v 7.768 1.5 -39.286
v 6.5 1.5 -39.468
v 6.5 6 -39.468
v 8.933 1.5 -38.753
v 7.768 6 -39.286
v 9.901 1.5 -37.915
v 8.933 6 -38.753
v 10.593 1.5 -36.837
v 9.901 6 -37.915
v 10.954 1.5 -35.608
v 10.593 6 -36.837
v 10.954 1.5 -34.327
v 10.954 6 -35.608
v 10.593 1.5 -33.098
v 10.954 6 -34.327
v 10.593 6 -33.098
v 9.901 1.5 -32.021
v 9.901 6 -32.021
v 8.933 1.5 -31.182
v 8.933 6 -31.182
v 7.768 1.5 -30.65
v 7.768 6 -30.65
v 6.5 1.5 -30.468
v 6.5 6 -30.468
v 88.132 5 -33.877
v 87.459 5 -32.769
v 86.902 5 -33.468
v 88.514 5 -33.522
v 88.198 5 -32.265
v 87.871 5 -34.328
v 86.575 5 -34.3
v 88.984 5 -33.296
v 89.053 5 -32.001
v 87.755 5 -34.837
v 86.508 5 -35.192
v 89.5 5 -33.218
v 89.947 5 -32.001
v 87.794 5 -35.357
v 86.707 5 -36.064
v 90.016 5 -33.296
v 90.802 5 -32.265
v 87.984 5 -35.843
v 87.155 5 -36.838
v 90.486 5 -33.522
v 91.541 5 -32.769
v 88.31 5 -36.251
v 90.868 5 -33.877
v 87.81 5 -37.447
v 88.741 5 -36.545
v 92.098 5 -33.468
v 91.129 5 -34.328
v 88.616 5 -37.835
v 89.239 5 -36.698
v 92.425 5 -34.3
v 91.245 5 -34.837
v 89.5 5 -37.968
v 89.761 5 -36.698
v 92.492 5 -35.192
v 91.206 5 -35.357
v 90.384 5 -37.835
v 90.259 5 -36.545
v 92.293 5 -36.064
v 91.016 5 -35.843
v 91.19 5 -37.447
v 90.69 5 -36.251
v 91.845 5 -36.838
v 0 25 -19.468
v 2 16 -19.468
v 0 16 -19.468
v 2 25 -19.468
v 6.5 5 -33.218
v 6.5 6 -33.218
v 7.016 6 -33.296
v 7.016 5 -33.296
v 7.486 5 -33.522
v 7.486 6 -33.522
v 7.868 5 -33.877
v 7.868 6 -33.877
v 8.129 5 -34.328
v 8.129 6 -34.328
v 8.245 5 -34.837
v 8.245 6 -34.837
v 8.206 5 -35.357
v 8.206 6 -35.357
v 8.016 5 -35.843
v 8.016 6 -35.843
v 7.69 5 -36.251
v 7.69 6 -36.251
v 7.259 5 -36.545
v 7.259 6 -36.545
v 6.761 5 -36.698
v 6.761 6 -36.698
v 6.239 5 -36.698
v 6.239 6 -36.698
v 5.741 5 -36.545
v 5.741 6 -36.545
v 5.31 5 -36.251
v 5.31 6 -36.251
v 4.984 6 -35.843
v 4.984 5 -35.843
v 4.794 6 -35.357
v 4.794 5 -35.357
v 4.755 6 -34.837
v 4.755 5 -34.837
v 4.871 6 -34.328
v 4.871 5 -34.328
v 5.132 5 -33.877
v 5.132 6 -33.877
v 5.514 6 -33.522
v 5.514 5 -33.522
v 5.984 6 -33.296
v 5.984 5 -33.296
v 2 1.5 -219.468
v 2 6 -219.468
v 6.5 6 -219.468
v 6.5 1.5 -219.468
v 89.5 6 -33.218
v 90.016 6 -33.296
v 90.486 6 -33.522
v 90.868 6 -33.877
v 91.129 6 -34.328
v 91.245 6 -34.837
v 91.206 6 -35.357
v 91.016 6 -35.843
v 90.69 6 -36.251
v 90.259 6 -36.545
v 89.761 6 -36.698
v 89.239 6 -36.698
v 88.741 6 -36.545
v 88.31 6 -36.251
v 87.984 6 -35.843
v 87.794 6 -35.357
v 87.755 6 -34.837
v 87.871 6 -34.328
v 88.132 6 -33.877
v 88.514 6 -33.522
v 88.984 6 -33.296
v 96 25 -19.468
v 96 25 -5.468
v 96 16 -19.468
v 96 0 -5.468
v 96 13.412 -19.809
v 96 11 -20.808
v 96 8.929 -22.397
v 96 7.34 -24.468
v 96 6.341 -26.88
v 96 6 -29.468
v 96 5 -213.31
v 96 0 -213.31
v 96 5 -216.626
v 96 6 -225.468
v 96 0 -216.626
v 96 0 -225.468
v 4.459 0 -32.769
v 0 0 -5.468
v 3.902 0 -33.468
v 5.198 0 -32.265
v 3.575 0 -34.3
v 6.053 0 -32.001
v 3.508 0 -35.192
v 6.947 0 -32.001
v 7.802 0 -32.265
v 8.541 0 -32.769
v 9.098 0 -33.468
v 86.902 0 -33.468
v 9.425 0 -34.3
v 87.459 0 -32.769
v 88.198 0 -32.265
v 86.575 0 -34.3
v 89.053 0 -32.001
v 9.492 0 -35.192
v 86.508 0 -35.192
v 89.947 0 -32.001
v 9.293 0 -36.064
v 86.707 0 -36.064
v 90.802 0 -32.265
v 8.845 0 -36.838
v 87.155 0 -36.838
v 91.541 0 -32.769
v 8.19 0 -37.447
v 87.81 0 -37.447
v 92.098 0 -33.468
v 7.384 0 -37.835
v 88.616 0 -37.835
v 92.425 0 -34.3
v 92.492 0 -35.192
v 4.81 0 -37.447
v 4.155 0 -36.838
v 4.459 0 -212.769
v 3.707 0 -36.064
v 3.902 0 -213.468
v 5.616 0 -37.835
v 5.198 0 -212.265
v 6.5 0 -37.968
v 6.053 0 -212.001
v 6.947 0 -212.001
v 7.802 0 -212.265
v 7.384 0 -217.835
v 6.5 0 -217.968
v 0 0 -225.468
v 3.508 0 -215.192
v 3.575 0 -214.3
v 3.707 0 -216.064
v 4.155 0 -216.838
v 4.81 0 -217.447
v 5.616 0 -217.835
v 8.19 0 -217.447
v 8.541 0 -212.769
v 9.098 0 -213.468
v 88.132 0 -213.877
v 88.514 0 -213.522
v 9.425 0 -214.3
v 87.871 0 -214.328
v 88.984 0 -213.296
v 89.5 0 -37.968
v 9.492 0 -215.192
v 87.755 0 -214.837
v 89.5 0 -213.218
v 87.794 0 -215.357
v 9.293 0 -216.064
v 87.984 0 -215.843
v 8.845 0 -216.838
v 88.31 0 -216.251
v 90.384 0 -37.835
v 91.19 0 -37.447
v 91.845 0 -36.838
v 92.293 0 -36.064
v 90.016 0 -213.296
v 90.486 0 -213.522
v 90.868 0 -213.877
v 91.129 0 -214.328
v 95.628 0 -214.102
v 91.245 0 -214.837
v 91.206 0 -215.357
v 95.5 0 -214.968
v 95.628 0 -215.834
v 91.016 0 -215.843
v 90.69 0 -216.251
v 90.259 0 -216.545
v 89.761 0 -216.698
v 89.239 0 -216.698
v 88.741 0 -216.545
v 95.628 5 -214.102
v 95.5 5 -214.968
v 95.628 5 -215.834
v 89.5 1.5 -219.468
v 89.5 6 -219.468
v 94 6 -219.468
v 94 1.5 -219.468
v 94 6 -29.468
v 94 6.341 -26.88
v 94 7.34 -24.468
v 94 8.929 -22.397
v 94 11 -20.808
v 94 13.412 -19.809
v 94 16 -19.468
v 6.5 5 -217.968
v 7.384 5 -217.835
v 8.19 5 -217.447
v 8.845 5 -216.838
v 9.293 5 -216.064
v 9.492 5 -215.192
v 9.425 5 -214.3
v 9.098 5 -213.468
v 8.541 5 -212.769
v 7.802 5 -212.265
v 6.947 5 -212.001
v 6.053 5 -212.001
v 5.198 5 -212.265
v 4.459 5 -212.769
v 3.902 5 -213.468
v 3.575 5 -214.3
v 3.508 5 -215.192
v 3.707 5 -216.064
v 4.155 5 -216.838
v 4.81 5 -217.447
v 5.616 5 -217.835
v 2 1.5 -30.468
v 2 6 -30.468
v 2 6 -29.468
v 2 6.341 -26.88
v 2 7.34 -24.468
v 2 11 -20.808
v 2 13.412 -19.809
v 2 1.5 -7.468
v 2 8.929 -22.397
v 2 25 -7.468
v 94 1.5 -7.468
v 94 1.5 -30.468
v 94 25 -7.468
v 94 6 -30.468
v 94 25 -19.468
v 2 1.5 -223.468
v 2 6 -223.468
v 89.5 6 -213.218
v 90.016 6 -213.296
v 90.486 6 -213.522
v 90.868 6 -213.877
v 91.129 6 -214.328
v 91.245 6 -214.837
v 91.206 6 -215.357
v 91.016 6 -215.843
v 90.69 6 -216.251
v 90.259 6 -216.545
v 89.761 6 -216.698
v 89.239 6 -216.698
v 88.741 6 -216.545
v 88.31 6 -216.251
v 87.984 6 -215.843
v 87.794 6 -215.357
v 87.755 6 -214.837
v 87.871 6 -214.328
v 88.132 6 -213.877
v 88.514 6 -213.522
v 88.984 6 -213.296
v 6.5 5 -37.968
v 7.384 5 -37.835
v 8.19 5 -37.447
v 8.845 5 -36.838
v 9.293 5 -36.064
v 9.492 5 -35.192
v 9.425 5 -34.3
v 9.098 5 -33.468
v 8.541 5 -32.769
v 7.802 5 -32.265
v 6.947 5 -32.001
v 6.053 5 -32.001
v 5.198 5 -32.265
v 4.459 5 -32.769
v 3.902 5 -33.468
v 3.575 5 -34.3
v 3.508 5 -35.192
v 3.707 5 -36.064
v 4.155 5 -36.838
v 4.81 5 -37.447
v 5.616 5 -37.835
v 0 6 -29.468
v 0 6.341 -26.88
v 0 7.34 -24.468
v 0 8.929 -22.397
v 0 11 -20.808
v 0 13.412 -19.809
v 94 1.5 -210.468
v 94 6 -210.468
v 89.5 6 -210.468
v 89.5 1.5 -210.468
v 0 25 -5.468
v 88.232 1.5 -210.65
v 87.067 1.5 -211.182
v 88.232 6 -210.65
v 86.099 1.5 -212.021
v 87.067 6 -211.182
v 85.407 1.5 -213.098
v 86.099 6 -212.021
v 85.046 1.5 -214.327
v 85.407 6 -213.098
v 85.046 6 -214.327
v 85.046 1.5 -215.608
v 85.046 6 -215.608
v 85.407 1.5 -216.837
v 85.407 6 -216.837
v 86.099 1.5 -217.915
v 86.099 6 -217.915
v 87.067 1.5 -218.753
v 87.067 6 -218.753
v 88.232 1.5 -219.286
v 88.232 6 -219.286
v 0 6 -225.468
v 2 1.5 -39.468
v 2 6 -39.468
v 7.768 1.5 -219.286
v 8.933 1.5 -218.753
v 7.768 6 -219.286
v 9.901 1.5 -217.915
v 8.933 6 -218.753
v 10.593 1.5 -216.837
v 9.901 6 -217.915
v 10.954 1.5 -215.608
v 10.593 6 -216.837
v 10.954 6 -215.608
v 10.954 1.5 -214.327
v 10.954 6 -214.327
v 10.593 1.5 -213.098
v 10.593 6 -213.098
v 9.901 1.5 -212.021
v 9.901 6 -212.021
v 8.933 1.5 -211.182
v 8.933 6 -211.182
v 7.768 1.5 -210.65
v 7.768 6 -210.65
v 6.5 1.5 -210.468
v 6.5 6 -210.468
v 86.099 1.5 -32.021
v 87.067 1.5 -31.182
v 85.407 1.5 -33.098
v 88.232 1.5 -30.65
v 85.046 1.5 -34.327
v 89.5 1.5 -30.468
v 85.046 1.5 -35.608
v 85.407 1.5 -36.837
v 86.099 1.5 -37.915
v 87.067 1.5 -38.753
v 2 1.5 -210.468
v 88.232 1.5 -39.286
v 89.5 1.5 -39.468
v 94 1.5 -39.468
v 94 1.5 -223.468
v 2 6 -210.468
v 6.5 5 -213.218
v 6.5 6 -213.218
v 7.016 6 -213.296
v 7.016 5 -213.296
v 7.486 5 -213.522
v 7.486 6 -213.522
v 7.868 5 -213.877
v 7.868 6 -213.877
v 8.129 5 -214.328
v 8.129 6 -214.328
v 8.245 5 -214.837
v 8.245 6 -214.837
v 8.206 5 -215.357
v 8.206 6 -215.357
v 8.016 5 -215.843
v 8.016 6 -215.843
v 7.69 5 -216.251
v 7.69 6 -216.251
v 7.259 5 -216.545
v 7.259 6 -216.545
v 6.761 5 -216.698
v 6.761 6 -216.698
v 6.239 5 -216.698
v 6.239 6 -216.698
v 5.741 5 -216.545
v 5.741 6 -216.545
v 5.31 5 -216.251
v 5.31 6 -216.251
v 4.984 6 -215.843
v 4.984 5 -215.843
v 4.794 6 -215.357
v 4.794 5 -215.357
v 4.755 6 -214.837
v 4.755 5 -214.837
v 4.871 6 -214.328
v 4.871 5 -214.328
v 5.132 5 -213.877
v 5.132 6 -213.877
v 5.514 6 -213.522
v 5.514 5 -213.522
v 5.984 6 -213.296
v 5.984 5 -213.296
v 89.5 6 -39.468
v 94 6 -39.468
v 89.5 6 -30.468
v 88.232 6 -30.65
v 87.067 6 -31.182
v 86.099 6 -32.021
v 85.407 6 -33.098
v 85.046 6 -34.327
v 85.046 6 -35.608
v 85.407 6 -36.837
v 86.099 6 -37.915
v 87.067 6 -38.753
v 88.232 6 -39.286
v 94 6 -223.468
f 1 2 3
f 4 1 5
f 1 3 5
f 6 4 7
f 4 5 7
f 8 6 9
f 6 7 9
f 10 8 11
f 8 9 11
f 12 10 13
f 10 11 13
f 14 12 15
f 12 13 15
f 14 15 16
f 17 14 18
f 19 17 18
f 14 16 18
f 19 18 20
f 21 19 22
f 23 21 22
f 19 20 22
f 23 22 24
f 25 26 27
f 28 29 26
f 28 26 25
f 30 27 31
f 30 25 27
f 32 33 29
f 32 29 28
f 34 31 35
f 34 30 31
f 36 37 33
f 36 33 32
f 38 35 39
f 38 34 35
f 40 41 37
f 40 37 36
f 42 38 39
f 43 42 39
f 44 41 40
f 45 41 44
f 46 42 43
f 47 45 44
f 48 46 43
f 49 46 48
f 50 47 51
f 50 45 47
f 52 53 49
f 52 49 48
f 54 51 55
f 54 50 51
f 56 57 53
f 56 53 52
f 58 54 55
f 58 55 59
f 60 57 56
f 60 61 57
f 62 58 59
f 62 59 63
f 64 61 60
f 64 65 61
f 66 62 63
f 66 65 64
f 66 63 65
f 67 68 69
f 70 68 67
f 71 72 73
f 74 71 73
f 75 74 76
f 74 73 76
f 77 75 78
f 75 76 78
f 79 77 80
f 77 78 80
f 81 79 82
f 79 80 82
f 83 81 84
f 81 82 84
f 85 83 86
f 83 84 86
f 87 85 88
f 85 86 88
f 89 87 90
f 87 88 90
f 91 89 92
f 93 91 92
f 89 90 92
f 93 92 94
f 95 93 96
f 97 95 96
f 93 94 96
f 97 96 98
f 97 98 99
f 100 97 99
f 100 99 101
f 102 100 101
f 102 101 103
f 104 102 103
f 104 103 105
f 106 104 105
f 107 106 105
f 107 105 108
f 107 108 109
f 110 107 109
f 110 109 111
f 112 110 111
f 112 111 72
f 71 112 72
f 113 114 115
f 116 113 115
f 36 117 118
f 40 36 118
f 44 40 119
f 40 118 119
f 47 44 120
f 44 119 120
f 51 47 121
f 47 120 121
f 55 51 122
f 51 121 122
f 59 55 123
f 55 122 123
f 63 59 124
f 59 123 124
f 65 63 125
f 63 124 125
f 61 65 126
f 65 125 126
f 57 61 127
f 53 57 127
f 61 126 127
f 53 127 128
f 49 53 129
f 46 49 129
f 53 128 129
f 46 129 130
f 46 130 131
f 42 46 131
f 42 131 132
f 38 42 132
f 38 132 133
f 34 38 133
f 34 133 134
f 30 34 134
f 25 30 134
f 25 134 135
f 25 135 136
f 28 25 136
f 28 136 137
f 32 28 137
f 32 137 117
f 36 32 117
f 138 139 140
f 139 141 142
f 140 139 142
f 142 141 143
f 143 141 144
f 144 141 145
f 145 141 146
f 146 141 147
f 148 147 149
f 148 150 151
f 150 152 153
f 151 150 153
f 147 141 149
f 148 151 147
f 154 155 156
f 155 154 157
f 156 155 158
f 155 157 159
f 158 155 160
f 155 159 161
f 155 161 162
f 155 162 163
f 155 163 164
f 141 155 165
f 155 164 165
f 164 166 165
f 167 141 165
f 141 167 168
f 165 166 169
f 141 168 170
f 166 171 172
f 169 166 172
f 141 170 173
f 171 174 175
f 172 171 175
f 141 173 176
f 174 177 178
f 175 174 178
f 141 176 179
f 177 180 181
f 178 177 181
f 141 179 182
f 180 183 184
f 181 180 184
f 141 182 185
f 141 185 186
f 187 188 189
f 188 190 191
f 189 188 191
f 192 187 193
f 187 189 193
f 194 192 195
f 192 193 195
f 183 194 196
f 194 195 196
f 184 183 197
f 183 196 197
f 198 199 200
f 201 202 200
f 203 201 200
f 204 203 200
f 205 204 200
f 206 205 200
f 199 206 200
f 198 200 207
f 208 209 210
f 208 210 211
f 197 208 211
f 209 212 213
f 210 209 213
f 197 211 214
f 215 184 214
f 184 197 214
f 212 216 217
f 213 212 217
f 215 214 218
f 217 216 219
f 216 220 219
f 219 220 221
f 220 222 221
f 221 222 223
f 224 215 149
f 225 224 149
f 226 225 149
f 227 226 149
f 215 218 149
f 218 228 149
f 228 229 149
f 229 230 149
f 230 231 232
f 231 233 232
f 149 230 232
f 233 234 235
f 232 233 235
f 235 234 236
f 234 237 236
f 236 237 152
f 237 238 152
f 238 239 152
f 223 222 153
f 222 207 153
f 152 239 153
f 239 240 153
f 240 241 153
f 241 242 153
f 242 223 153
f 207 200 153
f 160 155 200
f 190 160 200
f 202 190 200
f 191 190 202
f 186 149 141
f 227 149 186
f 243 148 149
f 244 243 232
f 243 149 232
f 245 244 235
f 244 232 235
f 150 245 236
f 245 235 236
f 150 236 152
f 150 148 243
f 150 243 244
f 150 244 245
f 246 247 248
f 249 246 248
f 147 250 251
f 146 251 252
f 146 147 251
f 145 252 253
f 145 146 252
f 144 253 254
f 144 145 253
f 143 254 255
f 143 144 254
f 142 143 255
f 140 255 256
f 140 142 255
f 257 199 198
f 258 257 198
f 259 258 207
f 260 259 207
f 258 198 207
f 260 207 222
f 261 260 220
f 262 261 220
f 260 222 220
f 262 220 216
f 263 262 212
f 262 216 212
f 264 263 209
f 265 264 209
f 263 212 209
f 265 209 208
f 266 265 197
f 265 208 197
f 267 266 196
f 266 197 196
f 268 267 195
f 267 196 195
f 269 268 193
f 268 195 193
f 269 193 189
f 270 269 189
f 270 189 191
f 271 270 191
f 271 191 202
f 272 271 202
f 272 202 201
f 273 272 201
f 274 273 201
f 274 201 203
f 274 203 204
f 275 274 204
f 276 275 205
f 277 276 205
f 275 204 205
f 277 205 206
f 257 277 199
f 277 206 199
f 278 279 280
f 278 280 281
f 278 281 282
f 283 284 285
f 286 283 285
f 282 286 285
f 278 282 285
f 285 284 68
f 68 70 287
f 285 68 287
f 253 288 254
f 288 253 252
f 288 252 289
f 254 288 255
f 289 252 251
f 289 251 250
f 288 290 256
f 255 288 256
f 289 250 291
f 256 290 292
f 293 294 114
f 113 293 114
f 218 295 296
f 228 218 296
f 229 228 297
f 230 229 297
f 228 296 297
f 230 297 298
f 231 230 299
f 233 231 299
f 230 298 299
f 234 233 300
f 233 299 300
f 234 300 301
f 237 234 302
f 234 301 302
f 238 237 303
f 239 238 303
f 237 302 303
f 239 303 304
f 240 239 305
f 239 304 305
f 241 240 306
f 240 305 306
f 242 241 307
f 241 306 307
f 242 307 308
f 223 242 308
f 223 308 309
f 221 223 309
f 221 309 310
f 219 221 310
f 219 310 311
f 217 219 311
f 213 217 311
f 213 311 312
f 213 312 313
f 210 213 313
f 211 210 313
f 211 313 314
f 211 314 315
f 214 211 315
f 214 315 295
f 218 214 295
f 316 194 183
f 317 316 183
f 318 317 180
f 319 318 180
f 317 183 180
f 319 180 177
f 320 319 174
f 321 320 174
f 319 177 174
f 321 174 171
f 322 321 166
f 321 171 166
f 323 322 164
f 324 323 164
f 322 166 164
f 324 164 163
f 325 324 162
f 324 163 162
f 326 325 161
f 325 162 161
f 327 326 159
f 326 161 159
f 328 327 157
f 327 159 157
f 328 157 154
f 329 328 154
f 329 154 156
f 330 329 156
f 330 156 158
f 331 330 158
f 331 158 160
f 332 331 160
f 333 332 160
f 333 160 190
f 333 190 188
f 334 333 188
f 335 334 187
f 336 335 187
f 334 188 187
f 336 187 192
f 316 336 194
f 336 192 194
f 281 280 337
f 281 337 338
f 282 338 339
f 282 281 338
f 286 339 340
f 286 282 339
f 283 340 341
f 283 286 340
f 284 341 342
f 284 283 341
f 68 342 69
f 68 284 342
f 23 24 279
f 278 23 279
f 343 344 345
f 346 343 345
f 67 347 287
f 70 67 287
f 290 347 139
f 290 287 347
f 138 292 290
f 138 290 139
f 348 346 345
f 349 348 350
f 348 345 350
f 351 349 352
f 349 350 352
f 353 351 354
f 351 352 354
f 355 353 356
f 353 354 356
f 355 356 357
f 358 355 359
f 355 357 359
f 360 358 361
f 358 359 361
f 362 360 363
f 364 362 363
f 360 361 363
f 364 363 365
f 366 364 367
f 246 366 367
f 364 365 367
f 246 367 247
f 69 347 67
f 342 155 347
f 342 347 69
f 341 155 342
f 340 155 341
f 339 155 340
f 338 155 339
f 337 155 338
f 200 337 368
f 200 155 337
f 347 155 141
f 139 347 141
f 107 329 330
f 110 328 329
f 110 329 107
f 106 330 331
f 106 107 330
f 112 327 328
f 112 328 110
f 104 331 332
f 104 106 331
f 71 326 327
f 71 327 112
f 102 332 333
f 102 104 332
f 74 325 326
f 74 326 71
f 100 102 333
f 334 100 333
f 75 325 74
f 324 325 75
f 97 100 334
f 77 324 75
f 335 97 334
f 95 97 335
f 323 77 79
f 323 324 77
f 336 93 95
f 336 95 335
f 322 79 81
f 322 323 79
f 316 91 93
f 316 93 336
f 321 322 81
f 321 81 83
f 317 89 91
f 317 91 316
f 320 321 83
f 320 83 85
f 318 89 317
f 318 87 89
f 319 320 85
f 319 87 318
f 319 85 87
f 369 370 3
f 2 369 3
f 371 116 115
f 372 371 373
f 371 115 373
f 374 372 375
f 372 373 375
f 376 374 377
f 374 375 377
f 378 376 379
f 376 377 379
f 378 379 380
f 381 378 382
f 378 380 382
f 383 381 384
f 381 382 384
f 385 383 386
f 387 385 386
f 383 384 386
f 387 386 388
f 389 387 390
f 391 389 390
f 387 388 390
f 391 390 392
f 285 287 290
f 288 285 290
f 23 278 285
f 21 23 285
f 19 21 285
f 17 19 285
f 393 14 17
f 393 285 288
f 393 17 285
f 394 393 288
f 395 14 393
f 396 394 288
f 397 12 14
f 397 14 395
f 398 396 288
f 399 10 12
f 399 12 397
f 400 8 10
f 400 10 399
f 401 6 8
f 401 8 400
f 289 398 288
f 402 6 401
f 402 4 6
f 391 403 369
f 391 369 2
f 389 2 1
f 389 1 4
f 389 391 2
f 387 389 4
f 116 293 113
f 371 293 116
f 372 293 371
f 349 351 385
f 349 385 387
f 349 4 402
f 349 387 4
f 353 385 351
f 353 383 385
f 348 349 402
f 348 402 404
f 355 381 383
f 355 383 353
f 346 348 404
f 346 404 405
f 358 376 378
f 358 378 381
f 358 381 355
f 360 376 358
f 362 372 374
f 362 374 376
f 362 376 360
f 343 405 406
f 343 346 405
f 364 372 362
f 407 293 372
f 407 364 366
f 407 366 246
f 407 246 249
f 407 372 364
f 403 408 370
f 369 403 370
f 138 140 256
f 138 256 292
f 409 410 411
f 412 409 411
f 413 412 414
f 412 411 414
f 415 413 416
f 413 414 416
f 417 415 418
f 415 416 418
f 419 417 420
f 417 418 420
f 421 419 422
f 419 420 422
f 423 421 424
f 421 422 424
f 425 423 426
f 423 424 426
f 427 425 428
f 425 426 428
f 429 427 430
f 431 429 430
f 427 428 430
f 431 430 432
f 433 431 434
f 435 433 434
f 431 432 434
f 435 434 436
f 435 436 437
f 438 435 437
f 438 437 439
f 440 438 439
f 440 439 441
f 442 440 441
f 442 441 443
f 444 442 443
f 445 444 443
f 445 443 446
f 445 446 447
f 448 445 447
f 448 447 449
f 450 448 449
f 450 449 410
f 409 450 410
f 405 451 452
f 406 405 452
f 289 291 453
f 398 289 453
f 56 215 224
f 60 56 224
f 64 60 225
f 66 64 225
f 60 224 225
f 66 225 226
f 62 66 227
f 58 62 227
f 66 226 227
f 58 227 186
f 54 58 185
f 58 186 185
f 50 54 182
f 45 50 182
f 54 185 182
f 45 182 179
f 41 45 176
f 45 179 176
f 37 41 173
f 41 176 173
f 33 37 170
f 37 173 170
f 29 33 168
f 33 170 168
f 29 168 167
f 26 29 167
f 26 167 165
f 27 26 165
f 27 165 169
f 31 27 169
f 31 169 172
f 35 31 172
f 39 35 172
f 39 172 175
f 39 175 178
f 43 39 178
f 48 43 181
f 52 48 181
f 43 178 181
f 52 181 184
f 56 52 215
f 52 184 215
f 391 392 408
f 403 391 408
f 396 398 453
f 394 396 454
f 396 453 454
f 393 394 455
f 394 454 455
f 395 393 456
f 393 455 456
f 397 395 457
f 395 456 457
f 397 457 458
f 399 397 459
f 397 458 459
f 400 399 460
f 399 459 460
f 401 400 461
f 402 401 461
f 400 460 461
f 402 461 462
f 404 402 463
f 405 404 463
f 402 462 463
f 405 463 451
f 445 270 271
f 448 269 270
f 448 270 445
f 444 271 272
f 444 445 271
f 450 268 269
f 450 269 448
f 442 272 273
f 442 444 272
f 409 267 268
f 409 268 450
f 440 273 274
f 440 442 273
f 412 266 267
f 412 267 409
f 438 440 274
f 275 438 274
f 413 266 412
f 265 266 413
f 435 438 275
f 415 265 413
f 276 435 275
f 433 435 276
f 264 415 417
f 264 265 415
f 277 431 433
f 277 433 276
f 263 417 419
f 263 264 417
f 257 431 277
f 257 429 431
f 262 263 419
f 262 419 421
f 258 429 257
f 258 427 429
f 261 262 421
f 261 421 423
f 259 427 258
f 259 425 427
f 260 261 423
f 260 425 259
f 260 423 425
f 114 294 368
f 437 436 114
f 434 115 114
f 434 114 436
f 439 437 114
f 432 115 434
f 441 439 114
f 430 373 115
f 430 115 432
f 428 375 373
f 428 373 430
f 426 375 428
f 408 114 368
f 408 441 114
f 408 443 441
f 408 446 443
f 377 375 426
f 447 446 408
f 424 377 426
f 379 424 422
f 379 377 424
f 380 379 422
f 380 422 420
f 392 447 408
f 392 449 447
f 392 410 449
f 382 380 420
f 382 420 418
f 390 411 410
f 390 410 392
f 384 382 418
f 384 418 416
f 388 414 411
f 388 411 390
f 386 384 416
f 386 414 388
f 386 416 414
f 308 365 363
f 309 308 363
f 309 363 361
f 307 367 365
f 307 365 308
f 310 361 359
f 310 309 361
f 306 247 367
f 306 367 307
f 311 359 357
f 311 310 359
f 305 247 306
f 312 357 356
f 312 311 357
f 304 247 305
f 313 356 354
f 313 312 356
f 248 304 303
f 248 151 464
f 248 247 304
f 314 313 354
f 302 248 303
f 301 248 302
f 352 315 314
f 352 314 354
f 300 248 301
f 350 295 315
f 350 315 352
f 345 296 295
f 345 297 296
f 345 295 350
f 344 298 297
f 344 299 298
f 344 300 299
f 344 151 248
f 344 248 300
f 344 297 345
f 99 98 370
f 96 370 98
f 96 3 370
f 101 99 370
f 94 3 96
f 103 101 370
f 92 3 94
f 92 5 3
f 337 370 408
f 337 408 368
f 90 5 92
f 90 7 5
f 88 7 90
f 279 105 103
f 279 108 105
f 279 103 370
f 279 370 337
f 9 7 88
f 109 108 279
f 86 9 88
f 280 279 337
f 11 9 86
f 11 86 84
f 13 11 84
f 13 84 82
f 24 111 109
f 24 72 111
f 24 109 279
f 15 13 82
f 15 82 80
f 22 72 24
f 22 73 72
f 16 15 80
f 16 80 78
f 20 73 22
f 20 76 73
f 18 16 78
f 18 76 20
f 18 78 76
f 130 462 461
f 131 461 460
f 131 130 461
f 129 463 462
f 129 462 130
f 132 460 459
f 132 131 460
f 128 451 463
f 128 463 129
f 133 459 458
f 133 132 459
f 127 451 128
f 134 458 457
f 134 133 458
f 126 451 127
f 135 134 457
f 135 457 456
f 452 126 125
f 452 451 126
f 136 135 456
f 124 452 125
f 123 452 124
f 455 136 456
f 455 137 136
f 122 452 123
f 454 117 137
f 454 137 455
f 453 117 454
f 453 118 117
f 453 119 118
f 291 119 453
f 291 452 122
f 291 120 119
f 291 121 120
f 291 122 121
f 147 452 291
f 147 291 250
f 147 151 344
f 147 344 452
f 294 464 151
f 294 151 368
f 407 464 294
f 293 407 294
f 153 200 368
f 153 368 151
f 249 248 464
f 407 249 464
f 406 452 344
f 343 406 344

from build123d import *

# Parameters (mm, degrees)
SKETCH1_W           = 96
SKETCH1_H           = 220
BOSS_EXTRUDE1_DEPTH = 25
CUT_EXTRUDE1_DEPTH  = 23.5
CUT_EXTRUDE2_REACH  = 248.327
CUT_EXTRUDE3_REACH  = 247.79
SKETCH4_R           = 1.75
SKETCH5_R           = 3
CUT_EXTRUDE4_DEPTH  = 5


with BuildPart() as part:
    # Sketch1 → Boss-Extrude1 (new body)
    with BuildSketch(Plane(origin=(0, 0, 0), x_dir=(1, 0, 0), z_dir=(0, 1, 0))):
        with Locations((48, 115.467836257)):
            Rectangle(SKETCH1_W, SKETCH1_H)
    extrude(amount=BOSS_EXTRUDE1_DEPTH)

    # Sketch2 → Cut-Extrude1 (cut)
    with BuildSketch(Plane(origin=(0, 25, 0), x_dir=(1, 0, 0), z_dir=(0, 1, 0))):
        with BuildLine():
            Line((2, 223.467836257), (2, 219.467836257))
            Line((2, 219.467836257), (6.5, 219.467836257))
            ThreePointArc((6.5, 219.467836257), (11, 214.967836257), (6.5, 210.467836257))
            Line((6.5, 210.467836257), (2, 210.467836257))
            Line((2, 210.467836257), (2, 39.467836257))
            Line((2, 39.467836257), (6.5, 39.467836257))
            ThreePointArc((6.5, 39.467836257), (11, 34.967836257), (6.5, 30.467836257))
            Line((6.5, 30.467836257), (2, 30.467836257))
            Line((2, 30.467836257), (2, 7.467836257))
            Line((2, 7.467836257), (94, 7.467836257))
            Line((94, 7.467836257), (94, 30.467836257))
            Line((94, 30.467836257), (89.5, 30.467836257))
            ThreePointArc((89.5, 30.467836257), (85, 34.967836257), (89.5, 39.467836257))
            Line((89.5, 39.467836257), (94, 39.467836257))
            Line((94, 39.467836257), (94, 210.467836257))
            Line((94, 210.467836257), (89.5, 210.467836257))
            ThreePointArc((89.5, 210.467836257), (85, 214.967836257), (89.5, 219.467836257))
            Line((89.5, 219.467836257), (94, 219.467836257))
            Line((94, 219.467836257), (94, 223.467836257))
            Line((94, 223.467836257), (2, 223.467836257))
        make_face()
    extrude(amount=-CUT_EXTRUDE1_DEPTH, mode=Mode.SUBTRACT)

    # Cut-Extrude2: up to this face of the body (flat: up to its plane)
    cut_extrude2_end = Plane(part.part.faces().sort_by_distance((0, 12.5, -115.467836257))[0])
    # Sketch3 → Cut-Extrude2 (cut, up to the picked face)
    with BuildSketch(Plane(origin=(96, 0, 0), x_dir=(0, 0, -1), z_dir=(1, 0, 0)), mode=Mode.PRIVATE) as cut_extrude2_sk1:
        with BuildLine():
            Line((225.467836257, 6), (29.467836257, 6))
            ThreePointArc((29.467836257, 6), (22.396768445, 8.928932188), (19.467836257, 16))
            Line((19.467836257, 16), (19.467836257, 25))
            Line((19.467836257, 25), (225.467836257, 25))
            Line((225.467836257, 25), (225.467836257, 6))
        make_face()
    cut_extrude2_tool1 = split(extrude(cut_extrude2_sk1.sketch, amount=-CUT_EXTRUDE2_REACH, mode=Mode.PRIVATE), bisect_by=cut_extrude2_end, keep=Keep.BOTH, mode=Mode.PRIVATE)
    add(cut_extrude2_tool1.solids().sort_by(Axis((96, 15.54006, -123.023377), (-1, 0, 0)))[0], mode=Mode.SUBTRACT)

    # Sketch4 → Cut-Extrude3 (cut, up to next)
    with BuildSketch(Plane(origin=(0, 6, 0), x_dir=(1, 0, 0), z_dir=(0, 1, 0)), mode=Mode.PRIVATE) as cut_extrude3_sk1:
        with Locations(Location((6.5, 34.967836257, 0), (0, 0, 270))):
            Circle(SKETCH4_R)
    cut_extrude3_tool1 = extrude(cut_extrude3_sk1.sketch, amount=-CUT_EXTRUDE3_REACH, mode=Mode.PRIVATE) & part.part
    # Sketch4 → Cut-Extrude3 (cut, up to next)
    with BuildSketch(Plane(origin=(0, 6, 0), x_dir=(1, 0, 0), z_dir=(0, 1, 0)), mode=Mode.PRIVATE) as cut_extrude3_sk2:
        with Locations(Location((89.5, 34.967836257, 0), (0, 0, 270))):
            Circle(SKETCH4_R)
    cut_extrude3_tool2 = extrude(cut_extrude3_sk2.sketch, amount=-CUT_EXTRUDE3_REACH, mode=Mode.PRIVATE) & part.part
    # Sketch4 → Cut-Extrude3 (cut, up to next)
    with BuildSketch(Plane(origin=(0, 6, 0), x_dir=(1, 0, 0), z_dir=(0, 1, 0)), mode=Mode.PRIVATE) as cut_extrude3_sk3:
        with Locations(Location((89.5, 214.967836257, 0), (0, 0, 270))):
            Circle(SKETCH4_R)
    cut_extrude3_tool3 = extrude(cut_extrude3_sk3.sketch, amount=-CUT_EXTRUDE3_REACH, mode=Mode.PRIVATE) & part.part
    # Sketch4 → Cut-Extrude3 (cut, up to next)
    with BuildSketch(Plane(origin=(0, 6, 0), x_dir=(1, 0, 0), z_dir=(0, 1, 0)), mode=Mode.PRIVATE) as cut_extrude3_sk4:
        with Locations(Location((6.5, 214.967836257, 0), (0, 0, 270))):
            Circle(SKETCH4_R)
    cut_extrude3_tool4 = extrude(cut_extrude3_sk4.sketch, amount=-CUT_EXTRUDE3_REACH, mode=Mode.PRIVATE) & part.part
    add(cut_extrude3_tool1.solids().sort_by_distance((6.5, 6, -34.967836))[0], mode=Mode.SUBTRACT)
    add(cut_extrude3_tool2.solids().sort_by_distance((89.5, 6, -34.967836))[0], mode=Mode.SUBTRACT)
    add(cut_extrude3_tool3.solids().sort_by_distance((89.5, 6, -214.967836))[0], mode=Mode.SUBTRACT)
    add(cut_extrude3_tool4.solids().sort_by_distance((6.5, 6, -214.967836))[0], mode=Mode.SUBTRACT)

    # Sketch5 → Cut-Extrude4 (cut)
    with BuildSketch(Plane.XZ):
        with Locations(Location((6.5, -34.967836257, 0), (0, 0, 270))):
            Circle(SKETCH5_R)
        with Locations(Location((89.5, -34.967836257, 0), (0, 0, 270))):
            Circle(SKETCH5_R)
        with Locations(Location((6.5, -214.967836257, 0), (0, 0, 270))):
            Circle(SKETCH5_R)
        with Locations((98.5, -214.967836257)):
            Circle(SKETCH5_R)
    extrude(amount=-CUT_EXTRUDE4_DEPTH, mode=Mode.SUBTRACT)


solid = part.part
